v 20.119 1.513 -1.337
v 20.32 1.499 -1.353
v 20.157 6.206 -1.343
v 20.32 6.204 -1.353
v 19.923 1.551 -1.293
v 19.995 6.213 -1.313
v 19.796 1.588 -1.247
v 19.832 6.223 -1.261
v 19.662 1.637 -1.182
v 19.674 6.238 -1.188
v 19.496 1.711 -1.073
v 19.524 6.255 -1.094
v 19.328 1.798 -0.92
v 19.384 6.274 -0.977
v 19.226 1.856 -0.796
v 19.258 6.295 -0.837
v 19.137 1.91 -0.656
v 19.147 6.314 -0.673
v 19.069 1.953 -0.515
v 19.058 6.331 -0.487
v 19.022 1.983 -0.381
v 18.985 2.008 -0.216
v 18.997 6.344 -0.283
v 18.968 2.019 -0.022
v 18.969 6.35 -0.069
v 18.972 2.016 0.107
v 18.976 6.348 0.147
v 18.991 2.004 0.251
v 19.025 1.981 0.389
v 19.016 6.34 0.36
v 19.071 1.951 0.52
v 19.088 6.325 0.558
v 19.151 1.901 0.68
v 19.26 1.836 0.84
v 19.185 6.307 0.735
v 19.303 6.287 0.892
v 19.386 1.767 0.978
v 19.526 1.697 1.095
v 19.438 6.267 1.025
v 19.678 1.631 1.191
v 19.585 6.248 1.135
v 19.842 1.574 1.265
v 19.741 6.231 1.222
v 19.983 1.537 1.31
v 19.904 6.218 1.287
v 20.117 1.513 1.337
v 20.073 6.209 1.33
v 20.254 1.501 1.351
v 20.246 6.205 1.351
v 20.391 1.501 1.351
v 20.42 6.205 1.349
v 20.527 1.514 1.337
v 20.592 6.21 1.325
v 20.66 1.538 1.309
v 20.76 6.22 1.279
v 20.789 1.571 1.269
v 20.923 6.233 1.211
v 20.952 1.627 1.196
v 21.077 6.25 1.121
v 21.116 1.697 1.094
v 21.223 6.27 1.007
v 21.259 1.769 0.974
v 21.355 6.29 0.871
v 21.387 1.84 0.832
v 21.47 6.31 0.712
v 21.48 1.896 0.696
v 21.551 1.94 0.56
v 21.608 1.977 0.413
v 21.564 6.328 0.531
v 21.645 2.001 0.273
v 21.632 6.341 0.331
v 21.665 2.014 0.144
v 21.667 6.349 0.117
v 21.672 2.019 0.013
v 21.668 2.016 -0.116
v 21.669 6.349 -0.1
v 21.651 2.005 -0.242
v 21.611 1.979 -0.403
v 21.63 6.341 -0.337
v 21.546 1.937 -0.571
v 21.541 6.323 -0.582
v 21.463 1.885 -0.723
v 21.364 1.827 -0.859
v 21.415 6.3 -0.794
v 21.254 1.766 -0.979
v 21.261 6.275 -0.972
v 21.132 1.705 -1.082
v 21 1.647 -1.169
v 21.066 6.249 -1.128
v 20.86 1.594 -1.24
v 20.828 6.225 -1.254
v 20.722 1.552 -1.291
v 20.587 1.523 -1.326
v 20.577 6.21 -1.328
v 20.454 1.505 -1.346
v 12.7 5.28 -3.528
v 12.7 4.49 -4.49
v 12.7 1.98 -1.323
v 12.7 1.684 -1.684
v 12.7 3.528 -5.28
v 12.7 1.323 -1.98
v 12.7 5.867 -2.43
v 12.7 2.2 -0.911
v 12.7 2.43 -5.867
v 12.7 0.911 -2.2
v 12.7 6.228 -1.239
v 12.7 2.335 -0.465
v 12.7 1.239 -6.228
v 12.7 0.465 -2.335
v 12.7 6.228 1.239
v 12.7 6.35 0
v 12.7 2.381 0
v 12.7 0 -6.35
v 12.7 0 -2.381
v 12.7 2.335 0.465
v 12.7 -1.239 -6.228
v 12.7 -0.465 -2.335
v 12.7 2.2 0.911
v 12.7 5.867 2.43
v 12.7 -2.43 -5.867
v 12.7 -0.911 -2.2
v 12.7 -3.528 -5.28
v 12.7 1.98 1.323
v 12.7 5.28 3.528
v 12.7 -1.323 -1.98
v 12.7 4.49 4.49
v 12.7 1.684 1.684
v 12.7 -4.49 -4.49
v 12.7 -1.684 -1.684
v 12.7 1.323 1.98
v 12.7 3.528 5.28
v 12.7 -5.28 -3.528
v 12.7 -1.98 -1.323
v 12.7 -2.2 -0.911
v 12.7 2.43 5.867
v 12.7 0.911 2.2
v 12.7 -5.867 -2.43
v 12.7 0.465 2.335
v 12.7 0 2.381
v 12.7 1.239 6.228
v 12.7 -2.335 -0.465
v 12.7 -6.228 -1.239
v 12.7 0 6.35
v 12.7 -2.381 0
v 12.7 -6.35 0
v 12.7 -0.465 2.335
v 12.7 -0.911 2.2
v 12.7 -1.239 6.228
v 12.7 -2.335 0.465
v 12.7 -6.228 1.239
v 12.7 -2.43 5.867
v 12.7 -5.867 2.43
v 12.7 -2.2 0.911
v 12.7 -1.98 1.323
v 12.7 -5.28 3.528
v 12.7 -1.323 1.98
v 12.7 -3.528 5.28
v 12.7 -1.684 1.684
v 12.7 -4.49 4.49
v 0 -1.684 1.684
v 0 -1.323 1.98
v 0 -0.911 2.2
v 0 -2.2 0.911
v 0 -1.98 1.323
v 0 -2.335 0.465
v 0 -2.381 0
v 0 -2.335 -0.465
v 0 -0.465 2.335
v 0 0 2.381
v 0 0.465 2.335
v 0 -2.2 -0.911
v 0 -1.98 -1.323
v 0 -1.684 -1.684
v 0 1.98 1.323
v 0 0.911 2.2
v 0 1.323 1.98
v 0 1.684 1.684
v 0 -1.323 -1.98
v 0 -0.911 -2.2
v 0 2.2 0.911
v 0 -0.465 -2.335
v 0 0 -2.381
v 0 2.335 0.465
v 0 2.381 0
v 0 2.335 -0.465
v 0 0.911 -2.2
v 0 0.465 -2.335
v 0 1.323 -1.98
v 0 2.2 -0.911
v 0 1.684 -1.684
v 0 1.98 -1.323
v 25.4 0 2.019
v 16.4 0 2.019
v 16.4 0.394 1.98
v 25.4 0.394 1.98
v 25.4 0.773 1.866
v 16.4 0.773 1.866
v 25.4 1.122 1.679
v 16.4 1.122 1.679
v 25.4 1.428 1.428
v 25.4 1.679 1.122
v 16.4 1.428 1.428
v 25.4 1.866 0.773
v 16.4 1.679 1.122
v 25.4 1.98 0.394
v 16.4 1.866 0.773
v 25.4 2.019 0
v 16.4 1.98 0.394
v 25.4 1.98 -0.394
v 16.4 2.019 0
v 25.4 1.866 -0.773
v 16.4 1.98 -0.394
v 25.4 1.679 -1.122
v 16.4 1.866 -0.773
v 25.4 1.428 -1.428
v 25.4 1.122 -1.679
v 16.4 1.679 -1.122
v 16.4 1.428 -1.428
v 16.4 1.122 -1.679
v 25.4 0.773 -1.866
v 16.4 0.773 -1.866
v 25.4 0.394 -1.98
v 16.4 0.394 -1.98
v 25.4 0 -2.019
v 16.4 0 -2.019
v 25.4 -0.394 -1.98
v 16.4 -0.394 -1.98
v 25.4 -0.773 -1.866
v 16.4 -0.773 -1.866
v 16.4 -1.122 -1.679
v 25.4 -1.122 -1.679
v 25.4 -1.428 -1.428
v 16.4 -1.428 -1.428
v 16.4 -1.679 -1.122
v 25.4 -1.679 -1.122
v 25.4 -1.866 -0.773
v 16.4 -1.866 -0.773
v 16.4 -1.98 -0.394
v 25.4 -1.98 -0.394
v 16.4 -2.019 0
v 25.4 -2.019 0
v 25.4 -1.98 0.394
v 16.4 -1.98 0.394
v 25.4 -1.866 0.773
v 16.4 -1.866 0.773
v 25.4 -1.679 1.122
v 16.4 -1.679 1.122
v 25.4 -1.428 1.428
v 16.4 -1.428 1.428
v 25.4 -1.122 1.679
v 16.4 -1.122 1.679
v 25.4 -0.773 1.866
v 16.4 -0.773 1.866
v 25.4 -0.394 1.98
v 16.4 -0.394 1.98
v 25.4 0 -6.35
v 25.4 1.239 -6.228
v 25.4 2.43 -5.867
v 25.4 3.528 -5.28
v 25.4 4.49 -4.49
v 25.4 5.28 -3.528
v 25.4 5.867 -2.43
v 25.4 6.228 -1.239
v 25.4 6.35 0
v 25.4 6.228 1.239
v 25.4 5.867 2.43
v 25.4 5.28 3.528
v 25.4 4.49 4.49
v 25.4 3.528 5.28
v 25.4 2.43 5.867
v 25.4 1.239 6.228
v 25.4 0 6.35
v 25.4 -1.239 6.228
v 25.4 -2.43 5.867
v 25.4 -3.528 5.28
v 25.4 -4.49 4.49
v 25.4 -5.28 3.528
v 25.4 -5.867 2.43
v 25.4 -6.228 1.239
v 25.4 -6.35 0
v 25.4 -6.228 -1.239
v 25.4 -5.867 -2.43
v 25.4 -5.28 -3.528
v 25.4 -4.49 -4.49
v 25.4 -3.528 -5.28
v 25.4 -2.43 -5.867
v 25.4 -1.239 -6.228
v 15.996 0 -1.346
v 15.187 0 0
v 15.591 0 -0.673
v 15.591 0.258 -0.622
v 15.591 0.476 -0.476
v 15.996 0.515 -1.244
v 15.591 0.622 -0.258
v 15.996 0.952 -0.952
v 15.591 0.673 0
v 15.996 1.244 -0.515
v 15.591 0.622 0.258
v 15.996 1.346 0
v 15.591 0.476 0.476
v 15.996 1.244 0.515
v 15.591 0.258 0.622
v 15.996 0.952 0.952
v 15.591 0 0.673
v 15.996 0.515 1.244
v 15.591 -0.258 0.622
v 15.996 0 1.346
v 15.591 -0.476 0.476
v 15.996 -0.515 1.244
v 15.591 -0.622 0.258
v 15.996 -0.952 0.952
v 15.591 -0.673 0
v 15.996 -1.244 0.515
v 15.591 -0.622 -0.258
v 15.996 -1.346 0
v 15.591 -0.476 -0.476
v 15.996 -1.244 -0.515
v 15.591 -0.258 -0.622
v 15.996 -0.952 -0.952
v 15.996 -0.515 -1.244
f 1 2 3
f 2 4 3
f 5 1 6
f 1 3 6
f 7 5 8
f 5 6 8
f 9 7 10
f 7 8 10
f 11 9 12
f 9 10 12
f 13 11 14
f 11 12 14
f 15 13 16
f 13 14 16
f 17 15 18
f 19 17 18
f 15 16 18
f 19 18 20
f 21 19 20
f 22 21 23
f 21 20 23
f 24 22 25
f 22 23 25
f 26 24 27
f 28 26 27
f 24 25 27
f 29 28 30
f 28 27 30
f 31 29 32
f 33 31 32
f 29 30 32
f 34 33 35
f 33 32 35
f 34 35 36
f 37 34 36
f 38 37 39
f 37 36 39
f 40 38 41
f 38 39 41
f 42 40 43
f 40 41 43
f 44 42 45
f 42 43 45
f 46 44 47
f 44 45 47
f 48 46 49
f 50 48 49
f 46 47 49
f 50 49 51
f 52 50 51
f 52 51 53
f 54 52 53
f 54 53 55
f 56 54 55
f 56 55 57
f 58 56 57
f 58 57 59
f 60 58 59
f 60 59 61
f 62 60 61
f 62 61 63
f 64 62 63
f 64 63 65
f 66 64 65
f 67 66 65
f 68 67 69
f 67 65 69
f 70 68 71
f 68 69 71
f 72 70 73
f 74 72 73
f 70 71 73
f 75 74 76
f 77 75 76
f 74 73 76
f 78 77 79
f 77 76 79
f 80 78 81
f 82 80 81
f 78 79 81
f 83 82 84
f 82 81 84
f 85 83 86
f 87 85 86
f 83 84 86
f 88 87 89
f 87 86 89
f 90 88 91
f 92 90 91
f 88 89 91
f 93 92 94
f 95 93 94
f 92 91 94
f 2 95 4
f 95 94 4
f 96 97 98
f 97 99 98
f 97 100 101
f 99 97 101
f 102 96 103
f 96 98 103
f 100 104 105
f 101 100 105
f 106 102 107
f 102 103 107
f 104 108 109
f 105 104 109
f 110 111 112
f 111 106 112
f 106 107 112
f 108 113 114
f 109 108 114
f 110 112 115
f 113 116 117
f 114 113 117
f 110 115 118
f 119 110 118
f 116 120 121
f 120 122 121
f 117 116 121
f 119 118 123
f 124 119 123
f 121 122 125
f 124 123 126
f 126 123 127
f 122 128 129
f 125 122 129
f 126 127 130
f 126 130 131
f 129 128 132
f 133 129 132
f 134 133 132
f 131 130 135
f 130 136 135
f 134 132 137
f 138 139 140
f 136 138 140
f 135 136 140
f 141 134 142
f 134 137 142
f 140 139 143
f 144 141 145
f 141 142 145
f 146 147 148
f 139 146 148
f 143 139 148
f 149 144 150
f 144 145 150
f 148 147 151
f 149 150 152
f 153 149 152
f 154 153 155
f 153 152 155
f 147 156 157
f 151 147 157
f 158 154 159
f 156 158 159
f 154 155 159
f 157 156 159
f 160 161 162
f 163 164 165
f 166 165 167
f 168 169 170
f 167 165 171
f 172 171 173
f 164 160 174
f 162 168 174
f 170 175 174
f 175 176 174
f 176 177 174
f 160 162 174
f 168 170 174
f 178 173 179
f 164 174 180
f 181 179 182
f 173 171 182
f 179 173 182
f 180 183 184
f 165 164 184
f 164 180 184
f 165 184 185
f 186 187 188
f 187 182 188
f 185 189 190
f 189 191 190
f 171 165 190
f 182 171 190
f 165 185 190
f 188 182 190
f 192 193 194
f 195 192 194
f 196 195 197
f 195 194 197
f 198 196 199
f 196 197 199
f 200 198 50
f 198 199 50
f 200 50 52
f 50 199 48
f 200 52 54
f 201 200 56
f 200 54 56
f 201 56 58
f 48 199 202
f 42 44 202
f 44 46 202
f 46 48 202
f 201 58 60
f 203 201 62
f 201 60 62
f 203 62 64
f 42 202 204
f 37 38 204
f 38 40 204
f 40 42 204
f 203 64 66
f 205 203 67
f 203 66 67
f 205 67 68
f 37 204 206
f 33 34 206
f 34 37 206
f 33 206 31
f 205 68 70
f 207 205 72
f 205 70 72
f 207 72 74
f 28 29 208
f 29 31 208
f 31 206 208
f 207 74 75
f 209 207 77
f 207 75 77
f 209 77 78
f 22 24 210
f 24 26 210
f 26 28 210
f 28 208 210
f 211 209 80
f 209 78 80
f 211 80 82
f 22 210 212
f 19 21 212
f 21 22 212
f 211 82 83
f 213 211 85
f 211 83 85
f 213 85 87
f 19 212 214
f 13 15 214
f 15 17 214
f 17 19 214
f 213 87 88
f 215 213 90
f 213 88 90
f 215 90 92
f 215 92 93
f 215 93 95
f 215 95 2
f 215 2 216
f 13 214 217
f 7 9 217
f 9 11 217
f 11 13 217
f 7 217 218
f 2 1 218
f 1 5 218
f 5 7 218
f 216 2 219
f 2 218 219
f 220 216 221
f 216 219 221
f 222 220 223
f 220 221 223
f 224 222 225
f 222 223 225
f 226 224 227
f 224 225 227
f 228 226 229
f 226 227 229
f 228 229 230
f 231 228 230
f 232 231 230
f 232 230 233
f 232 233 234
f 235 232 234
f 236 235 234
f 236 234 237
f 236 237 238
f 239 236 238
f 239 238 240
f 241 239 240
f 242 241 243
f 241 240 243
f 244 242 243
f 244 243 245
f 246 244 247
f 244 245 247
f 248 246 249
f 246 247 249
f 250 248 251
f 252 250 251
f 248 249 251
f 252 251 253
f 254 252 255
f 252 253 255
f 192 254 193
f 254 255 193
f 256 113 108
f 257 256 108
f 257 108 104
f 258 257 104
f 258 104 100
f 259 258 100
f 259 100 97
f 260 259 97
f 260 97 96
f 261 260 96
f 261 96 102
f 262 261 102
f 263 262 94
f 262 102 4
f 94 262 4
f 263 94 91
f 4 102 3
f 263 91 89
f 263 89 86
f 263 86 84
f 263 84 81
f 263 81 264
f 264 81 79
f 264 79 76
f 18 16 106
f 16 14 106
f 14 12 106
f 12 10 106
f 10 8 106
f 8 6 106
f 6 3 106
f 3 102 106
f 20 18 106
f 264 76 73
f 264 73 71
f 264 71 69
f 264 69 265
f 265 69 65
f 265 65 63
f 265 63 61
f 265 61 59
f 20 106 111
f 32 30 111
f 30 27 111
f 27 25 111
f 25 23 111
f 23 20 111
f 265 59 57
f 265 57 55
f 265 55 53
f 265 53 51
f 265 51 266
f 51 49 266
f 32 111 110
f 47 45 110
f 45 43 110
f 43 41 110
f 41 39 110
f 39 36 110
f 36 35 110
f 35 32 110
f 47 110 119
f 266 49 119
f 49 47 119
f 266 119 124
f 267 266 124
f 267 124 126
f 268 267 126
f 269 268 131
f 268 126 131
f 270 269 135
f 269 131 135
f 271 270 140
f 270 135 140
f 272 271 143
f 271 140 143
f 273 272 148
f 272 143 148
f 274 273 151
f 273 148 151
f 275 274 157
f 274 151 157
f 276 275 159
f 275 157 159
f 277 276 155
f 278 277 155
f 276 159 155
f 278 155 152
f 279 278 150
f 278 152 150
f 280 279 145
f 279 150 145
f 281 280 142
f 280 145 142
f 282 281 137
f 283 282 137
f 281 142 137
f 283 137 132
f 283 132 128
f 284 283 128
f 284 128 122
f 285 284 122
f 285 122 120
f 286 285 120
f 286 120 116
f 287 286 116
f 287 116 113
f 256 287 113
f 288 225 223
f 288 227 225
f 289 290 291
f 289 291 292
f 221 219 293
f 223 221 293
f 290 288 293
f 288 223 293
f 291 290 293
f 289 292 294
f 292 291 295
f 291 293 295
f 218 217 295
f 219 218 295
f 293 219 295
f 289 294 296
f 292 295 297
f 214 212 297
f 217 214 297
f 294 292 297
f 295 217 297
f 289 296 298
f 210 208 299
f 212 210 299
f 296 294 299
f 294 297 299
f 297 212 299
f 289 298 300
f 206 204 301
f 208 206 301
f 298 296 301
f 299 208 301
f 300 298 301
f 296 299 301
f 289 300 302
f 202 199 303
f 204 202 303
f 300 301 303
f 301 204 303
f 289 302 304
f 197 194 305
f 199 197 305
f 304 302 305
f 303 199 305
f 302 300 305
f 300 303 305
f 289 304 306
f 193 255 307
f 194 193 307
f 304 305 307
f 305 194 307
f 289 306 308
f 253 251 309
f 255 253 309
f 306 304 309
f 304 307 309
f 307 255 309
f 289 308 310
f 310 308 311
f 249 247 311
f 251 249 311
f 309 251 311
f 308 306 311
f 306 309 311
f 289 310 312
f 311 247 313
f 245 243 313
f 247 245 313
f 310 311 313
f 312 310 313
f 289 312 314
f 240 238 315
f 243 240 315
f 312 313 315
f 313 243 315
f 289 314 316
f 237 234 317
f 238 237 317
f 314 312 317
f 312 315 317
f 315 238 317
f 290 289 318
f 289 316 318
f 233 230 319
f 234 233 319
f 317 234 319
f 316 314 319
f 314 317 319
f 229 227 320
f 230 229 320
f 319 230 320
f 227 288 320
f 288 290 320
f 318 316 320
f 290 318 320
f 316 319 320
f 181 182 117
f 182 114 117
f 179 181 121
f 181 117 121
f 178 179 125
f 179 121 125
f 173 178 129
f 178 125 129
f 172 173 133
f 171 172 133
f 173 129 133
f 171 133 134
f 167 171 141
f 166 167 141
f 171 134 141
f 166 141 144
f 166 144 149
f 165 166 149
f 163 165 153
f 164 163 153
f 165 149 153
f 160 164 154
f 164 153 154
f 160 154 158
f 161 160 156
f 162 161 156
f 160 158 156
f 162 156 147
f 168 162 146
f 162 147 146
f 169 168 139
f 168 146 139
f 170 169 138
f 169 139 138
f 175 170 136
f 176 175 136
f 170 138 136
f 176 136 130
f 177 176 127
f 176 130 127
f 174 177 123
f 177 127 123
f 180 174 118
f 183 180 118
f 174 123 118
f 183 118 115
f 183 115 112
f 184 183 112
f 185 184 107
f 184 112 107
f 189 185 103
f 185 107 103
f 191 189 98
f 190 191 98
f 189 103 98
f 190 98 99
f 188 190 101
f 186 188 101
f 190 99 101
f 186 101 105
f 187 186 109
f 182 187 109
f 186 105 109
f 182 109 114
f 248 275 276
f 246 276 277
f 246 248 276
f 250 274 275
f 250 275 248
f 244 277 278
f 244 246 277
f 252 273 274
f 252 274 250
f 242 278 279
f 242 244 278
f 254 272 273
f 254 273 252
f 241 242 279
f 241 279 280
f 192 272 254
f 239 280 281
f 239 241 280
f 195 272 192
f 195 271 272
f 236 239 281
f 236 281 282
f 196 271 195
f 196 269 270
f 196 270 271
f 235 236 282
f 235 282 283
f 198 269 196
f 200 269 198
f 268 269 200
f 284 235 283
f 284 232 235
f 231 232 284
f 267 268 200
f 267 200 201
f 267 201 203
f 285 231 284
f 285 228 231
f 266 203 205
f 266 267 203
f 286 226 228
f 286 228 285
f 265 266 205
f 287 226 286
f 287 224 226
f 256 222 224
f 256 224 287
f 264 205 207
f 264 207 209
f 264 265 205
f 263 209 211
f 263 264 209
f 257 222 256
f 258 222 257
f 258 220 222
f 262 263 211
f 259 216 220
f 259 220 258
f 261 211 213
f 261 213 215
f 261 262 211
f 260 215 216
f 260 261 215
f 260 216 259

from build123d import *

# Parameters (mm, degrees)
SKETCH1_R                       = 6.35
BOSS_EXTRUDE1_DEPTH             = 25.4
F_21_0_159_DIAMETER_HOLE1_D     = 4.0386
F_21_0_159_DIAMETER_HOLE1_DEPTH = 9.0000074
F_21_0_159_DIAMETER_HOLE1_TIP   = 1.213317848
SKETCH5_W                       = 1.35255
SKETCH5_H                       = 6.35
SKETCH7_W                       = 12.7
SKETCH7_H                       = 3.96875


with BuildPart() as part:
    # Sketch1 → Boss-Extrude1 (new body)
    with BuildSketch(Plane(origin=(0, 0, 0), x_dir=(0, 0, -1), z_dir=(1, 0, 0))):
        Circle(SKETCH1_R)
    extrude(amount=BOSS_EXTRUDE1_DEPTH)

    # #21 (0.159) Diameter Hole1
    with Locations(Plane(origin=(25.4, 0, 0), x_dir=(0, 0, -1), z_dir=(1, 0, 0))):
        with Locations((0, 0)):
            Hole(F_21_0_159_DIAMETER_HOLE1_D / 2, depth=F_21_0_159_DIAMETER_HOLE1_DEPTH)
            with Locations((0, 0, -(F_21_0_159_DIAMETER_HOLE1_DEPTH + F_21_0_159_DIAMETER_HOLE1_TIP / 2))):  # 118° drill point
                Cone(0, F_21_0_159_DIAMETER_HOLE1_D / 2, F_21_0_159_DIAMETER_HOLE1_TIP, mode=Mode.SUBTRACT)

    # Sketch5 → #6-32 Tapped Hole1 (revolve, cut)
    with BuildSketch(Plane(origin=(20.32, 0, 0), x_dir=(0, 0, -1), z_dir=(1, 0, 0))):
        with Locations((0.676275, 3.175)):
            Rectangle(SKETCH5_W, SKETCH5_H)
    revolve(axis=Axis((20.32, -6.35, 0), (0, 1, 0)), mode=Mode.SUBTRACT)

    # Sketch7 → Cut-Revolve1 (revolve, cut)
    with BuildSketch(Plane(origin=(0, 0, 0), x_dir=(1, 0, 0), z_dir=(0, 1, 0))):
        with Locations((6.35, 4.365625)):
            Rectangle(SKETCH7_W, SKETCH7_H)
    revolve(axis=Axis((25.4, 0, 0), (-1, 0, 0)), mode=Mode.SUBTRACT)


solid = part.part
